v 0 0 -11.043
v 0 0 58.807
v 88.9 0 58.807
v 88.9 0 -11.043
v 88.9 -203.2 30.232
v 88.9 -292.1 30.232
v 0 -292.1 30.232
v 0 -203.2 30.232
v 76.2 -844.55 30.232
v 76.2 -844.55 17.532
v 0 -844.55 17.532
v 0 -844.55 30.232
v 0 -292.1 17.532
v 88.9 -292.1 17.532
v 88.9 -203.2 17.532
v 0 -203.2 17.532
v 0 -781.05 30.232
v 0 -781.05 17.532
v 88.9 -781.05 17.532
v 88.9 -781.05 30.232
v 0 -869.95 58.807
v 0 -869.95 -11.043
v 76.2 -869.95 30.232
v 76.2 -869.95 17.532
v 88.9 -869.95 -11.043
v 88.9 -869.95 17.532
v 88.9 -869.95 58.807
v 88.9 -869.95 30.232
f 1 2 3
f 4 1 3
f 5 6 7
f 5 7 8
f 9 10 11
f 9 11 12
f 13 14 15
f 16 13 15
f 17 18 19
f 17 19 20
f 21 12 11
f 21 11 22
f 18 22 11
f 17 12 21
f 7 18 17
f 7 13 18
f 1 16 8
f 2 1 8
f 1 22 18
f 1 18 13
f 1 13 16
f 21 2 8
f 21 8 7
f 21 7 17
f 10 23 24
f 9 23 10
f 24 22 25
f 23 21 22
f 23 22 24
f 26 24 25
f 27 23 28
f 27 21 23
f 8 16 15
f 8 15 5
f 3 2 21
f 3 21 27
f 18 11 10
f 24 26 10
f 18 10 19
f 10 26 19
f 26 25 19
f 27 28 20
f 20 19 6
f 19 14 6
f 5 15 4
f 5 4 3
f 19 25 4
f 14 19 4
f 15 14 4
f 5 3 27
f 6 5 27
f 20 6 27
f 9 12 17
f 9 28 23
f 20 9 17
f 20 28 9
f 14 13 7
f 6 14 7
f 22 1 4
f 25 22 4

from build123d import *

# Parameters (mm, degrees)
F0_W     = 88.9
F0_H     = 69.85
F1_DEPTH = 869.95
F2_W     = 25.4
F2_H     = 12.7
F3_DEPTH = 12.7
F4_W     = 63.5
F4_H     = 12.7
F5_DEPTH = 88.9
F6_W     = 88.9
F6_H     = 12.7
F7_DEPTH = 88.9


with BuildPart() as f1:
    # F0 (on Front) → F1 (new body)
    with BuildSketch(Plane.XZ):
        with Locations((44.45, 23.882015)):
            Rectangle(F0_W, F0_H)
    extrude(amount=F1_DEPTH)

    # F2 (on face) → F3 (cut)
    with BuildSketch(Plane.YZ.offset(88.9)):
        with Locations((-857.25, 23.882015)):
            Rectangle(F2_W, F2_H)
    extrude(amount=-F3_DEPTH, mode=Mode.SUBTRACT)

    # F4 (on face) → F5 (cut, through all)
    with BuildSketch(Plane.YZ.offset(88.9)):
        with Locations((-812.8, 23.882015)):
            Rectangle(F4_W, F4_H)
    extrude(amount=-F5_DEPTH, mode=Mode.SUBTRACT)

    # F6 (on face) → F7 (cut, through all)
    with BuildSketch(Plane.YZ.offset(88.9)):
        with Locations((-247.65, 23.882015)):
            Rectangle(F6_W, F6_H)
    extrude(amount=-F7_DEPTH, mode=Mode.SUBTRACT)


solid = f1.part
